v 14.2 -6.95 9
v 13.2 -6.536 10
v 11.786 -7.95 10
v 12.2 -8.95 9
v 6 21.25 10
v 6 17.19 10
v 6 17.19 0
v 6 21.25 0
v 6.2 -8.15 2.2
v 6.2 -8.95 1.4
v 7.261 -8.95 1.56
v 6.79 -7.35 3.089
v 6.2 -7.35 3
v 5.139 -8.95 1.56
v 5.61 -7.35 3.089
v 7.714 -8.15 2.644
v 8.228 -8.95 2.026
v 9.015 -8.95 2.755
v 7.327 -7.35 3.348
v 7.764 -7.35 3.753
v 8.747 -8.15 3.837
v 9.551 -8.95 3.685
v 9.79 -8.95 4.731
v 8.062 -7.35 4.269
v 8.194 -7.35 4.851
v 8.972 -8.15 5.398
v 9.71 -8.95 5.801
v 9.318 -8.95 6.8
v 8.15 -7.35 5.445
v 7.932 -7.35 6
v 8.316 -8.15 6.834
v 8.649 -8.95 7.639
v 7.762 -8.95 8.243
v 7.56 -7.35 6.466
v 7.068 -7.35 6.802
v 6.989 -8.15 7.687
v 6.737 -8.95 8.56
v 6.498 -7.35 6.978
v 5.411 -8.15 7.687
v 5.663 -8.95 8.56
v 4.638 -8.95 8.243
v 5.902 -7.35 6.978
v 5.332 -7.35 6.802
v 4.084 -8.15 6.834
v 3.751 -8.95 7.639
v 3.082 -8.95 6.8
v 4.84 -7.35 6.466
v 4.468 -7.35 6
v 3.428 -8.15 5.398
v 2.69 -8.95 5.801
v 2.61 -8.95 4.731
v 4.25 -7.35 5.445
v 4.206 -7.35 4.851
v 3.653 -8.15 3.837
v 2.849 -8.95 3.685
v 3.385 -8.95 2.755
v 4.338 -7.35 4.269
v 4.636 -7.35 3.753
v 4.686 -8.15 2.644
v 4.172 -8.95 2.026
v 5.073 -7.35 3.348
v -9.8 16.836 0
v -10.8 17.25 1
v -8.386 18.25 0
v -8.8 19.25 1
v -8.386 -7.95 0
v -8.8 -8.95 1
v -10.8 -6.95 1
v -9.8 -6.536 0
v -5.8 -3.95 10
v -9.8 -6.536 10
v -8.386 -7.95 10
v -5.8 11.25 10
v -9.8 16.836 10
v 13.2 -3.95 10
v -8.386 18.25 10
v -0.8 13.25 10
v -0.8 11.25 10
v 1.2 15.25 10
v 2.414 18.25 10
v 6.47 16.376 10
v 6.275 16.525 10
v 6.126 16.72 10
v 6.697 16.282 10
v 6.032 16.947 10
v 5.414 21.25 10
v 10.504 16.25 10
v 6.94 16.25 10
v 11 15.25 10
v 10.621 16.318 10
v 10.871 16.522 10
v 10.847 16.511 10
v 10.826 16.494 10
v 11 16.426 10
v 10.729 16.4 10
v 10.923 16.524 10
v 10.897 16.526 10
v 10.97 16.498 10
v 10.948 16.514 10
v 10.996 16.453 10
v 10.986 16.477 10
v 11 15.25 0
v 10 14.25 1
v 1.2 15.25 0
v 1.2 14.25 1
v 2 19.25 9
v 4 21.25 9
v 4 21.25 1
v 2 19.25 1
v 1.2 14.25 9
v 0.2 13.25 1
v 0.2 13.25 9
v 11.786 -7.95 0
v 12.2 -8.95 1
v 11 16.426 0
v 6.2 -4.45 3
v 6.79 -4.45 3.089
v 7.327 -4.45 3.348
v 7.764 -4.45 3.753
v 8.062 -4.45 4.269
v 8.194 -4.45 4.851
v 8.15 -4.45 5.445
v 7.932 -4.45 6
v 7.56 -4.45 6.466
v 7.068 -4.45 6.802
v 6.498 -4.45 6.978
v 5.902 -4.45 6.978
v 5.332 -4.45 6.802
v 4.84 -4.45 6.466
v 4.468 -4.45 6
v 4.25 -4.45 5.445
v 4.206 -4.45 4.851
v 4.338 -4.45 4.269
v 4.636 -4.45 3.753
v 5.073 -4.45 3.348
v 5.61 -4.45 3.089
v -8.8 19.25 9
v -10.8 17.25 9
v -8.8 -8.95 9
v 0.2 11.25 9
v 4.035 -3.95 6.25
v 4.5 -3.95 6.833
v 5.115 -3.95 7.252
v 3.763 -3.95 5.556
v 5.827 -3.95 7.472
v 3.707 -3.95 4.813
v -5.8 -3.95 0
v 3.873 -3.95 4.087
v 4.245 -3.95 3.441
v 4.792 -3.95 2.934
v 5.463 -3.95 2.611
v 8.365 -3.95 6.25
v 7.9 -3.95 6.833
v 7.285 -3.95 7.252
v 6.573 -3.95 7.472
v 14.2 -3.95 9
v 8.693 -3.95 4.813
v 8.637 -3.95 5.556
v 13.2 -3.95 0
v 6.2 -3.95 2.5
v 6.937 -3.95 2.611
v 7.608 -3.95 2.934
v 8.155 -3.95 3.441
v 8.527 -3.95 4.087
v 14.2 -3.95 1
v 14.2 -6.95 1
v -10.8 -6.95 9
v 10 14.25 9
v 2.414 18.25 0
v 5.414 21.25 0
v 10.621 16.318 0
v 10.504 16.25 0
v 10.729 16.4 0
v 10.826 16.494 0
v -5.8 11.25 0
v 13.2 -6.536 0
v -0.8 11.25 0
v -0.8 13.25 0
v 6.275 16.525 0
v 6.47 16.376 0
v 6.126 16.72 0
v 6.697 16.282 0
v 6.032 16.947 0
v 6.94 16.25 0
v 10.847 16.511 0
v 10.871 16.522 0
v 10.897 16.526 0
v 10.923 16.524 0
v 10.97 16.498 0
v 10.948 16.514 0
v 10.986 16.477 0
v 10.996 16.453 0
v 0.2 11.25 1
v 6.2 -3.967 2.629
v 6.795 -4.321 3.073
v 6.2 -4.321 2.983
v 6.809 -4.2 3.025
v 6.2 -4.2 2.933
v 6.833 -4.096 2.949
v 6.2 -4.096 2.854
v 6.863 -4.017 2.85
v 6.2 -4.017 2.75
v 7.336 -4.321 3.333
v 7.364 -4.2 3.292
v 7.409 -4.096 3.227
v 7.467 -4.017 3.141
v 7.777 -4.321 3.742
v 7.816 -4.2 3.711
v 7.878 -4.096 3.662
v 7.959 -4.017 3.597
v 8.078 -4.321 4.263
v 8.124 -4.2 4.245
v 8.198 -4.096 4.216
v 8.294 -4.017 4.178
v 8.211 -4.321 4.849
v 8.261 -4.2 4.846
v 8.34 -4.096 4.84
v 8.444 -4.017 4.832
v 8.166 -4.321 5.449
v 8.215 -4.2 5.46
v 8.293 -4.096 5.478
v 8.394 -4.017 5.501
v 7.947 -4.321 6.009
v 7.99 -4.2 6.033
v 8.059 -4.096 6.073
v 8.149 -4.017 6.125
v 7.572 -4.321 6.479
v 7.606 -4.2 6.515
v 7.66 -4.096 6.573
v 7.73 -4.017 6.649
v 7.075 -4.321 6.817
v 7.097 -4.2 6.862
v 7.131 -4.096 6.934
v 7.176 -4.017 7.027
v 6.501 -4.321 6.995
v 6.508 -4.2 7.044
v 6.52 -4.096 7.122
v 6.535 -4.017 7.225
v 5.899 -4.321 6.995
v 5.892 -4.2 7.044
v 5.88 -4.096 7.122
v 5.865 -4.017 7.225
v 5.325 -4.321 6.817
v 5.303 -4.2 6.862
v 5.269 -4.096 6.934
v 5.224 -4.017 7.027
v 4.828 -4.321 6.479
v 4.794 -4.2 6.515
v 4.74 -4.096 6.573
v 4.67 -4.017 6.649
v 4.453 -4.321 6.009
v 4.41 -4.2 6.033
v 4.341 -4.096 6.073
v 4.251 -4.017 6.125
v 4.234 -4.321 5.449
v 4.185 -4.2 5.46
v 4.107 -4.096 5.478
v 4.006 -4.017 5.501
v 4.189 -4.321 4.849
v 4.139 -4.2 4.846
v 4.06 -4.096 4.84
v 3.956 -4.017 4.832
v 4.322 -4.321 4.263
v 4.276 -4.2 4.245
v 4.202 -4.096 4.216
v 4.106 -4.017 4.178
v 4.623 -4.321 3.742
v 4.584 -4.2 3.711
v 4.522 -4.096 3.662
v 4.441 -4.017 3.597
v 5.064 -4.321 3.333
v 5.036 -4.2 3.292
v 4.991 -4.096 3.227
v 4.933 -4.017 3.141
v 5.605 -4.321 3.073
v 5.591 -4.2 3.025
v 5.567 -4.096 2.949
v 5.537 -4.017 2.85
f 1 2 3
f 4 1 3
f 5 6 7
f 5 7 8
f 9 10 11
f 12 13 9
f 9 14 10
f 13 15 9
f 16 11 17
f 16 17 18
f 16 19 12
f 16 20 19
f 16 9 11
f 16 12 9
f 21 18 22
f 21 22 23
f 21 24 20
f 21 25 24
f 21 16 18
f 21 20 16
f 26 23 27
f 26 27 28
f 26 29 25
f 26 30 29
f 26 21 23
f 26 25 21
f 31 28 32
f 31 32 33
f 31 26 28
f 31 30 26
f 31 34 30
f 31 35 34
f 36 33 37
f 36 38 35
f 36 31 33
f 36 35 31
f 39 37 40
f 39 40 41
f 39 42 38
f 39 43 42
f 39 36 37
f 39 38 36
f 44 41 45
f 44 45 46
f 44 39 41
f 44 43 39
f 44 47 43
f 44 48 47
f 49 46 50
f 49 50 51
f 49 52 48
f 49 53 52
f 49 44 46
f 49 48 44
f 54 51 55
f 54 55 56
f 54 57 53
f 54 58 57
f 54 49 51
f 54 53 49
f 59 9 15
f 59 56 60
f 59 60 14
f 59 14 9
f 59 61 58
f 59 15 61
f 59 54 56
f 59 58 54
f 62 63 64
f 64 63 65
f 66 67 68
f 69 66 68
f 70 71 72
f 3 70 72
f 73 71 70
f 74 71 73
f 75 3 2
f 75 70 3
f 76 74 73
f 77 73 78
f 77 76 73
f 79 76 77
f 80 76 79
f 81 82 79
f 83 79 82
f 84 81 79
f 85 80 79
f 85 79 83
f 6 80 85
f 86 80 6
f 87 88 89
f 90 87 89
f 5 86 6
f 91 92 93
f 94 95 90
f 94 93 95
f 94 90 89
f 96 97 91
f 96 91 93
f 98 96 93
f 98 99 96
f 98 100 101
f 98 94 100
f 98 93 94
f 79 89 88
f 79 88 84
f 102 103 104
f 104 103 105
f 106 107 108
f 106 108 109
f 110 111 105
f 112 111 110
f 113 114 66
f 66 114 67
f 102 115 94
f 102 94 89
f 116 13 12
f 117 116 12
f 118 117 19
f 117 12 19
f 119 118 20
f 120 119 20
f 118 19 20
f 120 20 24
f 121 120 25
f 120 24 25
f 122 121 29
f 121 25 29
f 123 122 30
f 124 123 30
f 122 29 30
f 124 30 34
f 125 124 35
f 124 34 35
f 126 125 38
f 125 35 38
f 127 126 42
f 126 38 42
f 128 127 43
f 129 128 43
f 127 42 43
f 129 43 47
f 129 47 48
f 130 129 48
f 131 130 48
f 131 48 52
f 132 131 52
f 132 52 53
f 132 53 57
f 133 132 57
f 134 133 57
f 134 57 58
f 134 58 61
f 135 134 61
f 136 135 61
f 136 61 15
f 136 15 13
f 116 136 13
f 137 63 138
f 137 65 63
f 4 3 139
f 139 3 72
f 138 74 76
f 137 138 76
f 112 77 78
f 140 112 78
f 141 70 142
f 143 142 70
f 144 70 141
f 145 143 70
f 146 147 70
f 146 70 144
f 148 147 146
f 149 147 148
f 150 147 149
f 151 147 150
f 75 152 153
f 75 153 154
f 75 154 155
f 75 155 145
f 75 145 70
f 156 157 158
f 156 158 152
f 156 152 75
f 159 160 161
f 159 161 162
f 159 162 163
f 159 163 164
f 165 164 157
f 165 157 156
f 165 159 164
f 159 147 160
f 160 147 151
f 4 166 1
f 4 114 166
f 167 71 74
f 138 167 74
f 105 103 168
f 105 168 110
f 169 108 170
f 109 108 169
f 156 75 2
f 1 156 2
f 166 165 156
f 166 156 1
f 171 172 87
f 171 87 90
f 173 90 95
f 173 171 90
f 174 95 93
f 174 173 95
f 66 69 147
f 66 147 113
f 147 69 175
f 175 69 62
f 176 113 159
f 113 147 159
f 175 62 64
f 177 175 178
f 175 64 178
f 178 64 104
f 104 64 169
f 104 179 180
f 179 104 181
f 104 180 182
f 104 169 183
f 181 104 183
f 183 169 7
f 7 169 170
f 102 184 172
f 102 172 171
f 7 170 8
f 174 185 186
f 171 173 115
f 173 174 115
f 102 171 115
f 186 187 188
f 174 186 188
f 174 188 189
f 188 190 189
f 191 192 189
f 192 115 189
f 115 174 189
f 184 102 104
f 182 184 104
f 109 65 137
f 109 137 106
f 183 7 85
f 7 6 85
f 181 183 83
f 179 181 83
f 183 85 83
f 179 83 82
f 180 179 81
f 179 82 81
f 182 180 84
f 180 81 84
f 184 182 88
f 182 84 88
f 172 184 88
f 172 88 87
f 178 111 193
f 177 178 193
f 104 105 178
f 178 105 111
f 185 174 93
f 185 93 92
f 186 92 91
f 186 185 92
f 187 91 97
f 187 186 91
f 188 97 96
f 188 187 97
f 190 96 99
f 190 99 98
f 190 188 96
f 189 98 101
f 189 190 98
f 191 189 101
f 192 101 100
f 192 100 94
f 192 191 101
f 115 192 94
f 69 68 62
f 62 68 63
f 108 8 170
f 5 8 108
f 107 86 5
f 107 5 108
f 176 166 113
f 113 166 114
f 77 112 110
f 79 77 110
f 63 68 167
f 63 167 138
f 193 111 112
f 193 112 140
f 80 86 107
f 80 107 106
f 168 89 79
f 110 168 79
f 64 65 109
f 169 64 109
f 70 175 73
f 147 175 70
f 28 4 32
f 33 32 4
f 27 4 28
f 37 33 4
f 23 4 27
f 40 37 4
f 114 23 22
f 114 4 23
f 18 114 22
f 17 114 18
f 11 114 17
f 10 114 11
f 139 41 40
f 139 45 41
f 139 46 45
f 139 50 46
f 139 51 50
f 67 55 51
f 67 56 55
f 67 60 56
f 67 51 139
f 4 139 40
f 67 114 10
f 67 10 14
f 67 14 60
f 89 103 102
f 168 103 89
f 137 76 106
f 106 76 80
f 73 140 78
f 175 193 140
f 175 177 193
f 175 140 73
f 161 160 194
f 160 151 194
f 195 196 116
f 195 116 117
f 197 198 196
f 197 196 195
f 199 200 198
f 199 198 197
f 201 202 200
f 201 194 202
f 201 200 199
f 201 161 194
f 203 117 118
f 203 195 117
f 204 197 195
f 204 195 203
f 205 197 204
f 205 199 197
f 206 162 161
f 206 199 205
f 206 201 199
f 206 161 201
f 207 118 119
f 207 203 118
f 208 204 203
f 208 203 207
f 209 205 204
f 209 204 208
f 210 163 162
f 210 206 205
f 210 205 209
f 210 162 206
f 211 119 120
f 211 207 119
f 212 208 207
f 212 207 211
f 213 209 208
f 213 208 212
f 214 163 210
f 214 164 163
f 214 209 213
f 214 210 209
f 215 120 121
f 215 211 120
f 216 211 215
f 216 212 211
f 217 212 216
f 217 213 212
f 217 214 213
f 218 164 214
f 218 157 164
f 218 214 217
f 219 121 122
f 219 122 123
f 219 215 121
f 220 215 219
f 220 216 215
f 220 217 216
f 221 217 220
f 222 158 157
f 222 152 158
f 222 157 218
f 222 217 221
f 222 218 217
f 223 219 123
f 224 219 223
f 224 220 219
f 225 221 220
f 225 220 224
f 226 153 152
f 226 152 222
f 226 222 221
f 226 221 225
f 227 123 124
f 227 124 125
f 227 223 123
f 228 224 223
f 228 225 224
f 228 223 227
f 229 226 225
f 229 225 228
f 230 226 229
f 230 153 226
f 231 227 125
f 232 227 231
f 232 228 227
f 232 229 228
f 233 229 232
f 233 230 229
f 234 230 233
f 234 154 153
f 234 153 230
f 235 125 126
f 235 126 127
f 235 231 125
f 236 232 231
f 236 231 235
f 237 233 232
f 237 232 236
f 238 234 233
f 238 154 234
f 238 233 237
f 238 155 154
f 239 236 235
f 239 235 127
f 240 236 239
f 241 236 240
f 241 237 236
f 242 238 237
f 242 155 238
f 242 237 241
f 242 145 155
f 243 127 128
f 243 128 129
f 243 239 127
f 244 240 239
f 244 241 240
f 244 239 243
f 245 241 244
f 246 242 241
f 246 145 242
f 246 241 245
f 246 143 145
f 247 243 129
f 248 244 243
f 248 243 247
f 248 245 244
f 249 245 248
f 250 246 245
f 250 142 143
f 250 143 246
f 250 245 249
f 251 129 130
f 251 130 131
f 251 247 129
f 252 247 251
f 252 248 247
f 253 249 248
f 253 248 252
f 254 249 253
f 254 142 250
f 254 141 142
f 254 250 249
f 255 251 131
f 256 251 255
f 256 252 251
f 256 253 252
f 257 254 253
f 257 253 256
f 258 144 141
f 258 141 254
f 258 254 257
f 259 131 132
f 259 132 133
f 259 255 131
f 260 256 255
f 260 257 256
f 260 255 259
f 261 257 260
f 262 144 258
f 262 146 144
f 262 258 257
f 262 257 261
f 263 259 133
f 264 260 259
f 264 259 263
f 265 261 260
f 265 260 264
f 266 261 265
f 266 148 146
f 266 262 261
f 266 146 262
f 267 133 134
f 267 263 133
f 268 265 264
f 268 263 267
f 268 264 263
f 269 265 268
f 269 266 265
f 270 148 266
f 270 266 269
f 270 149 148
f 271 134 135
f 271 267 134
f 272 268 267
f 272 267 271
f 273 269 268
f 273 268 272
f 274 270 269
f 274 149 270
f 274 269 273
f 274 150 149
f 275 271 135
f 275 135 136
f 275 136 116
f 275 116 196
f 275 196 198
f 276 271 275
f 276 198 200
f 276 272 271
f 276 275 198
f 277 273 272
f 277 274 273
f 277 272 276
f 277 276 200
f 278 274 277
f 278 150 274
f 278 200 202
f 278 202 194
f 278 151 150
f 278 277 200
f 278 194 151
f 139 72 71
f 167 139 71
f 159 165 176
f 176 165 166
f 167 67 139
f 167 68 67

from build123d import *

# Parameters (mm, degrees)
RESSALTO_EXTRUS_O1_DEPTH = 10
ESBO_O3_R                = 2
CORTE_EXTRUS_O1_DEPTH    = 15
CHANFRO1_SIZE            = 1.6
FILETE1_R                = 0.5
FILETE2_R                = 0.94
RESSALTO_EXTRUS_O3_DEPTH = 10
CHANFRO5_SIZE            = 2
CHANFRO4_SIZE            = 1


with BuildPart() as part:
    # Esboço1 → Ressalto-extrusão1 (new body)
    with BuildSketch(Plane.XY):
        with BuildLine():
            Line((11, 14.25), (0.2, 14.25))
            Line((0.2, 14.25), (0.2, 11.25))
            Line((0.2, 11.25), (-5.8, 11.25))
            Line((-5.8, 11.25), (-5.8, -3.95))
            Line((-5.8, -3.95), (14.2, -3.95))
            Line((14.2, -3.95), (14.2, -8.95))
            Line((14.2, -8.95), (-10.8, -8.95))
            Line((-10.8, -8.95), (-10.8, 19.25))
            Line((-10.8, 19.25), (6, 19.25))
            Line((6, 19.25), (6, 16.25))
            Line((6, 16.25), (10.504380809, 16.25))
            ThreePointArc((10.504380809, 16.25), (10.676386068, 16.357306387), (10.826229508, 16.493861918))
            ThreePointArc((10.826229508, 16.493861918), (10.936214298, 16.519561844), (11, 16.426349589))
            Line((11, 16.426349589), (11, 16.25))
            Line((11, 16.25), (11, 14.25))
        make_face()
    extrude(amount=RESSALTO_EXTRUS_O1_DEPTH)

    # Esboço3 → Corte-extrusão1 (cut)
    with BuildSketch(Plane.XZ.offset(8.95)):
        with Locations(Location((6.2, 5, 0), (0, 0, 270))):
            Circle(ESBO_O3_R)
    extrude(amount=-CORTE_EXTRUS_O1_DEPTH, mode=Mode.SUBTRACT)

    # Chanfro1
    chanfro1_edges = [part.edges().sort_by_distance(p)[0] for p in [
        (6.2, -8.95, 7),
    ]]
    chamfer(chanfro1_edges, length=CHANFRO1_SIZE)

    # Filete1
    filete1_edges = [part.edges().sort_by_distance(p)[0] for p in [
        (6.2, -3.95, 7),
    ]]
    fillet(filete1_edges, radius=FILETE1_R)

    # Filete2
    filete2_edges = [part.edges().sort_by_distance(p)[0] for p in [
        (6, 16.25, 5),
    ]]
    fillet(filete2_edges, radius=FILETE2_R)

    # Esboço5 → Ressalto-extrusão3 (add)
    with BuildSketch(Plane.XY.offset(10)):
        Polygon((6, 19.25), (6, 21.25), (4, 21.25), (2, 19.25), align=None)
    extrude(amount=-RESSALTO_EXTRUS_O3_DEPTH)

    # Chanfro5
    chanfro5_edges = [part.edges().sort_by_distance(p)[0] for p in [
        (14.2, -8.95, 5),
        (-10.8, -8.95, 5),
        (-10.8, 19.25, 5),
    ]]
    chamfer(chanfro5_edges, length=CHANFRO5_SIZE)

    # Chanfro4
    chanfro4_edges = [part.edges().sort_by_distance(p)[0] for p in [
        (5.6, 14.25, 0),
        (0.2, 12.75, 0),
        (11, 14.25, 5),
        (0.2, 14.25, 5),
        (0.2, 12.75, 10),
        (-3.4, 19.25, 0),
        (-3.4, 19.25, 10),
        (3, 20.25, 10),
        (3, 20.25, 0),
        (14.2, -5.45, 0),
        (14.2, -5.45, 10),
        (1.7, -8.95, 0),
        (-10.8, 5.15, 0),
        (-9.8, 18.25, 0),
        (-9.8, -7.95, 0),
        (13.2, -7.95, 0),
        (1.7, -8.95, 10),
        (-10.8, 5.15, 10),
        (-9.8, 18.25, 10),
        (-9.8, -7.95, 10),
        (13.2, -7.95, 10),
        (5.6, 14.25, 10),
    ]]
    chamfer(chanfro4_edges, length=CHANFRO4_SIZE)


solid = part.part
